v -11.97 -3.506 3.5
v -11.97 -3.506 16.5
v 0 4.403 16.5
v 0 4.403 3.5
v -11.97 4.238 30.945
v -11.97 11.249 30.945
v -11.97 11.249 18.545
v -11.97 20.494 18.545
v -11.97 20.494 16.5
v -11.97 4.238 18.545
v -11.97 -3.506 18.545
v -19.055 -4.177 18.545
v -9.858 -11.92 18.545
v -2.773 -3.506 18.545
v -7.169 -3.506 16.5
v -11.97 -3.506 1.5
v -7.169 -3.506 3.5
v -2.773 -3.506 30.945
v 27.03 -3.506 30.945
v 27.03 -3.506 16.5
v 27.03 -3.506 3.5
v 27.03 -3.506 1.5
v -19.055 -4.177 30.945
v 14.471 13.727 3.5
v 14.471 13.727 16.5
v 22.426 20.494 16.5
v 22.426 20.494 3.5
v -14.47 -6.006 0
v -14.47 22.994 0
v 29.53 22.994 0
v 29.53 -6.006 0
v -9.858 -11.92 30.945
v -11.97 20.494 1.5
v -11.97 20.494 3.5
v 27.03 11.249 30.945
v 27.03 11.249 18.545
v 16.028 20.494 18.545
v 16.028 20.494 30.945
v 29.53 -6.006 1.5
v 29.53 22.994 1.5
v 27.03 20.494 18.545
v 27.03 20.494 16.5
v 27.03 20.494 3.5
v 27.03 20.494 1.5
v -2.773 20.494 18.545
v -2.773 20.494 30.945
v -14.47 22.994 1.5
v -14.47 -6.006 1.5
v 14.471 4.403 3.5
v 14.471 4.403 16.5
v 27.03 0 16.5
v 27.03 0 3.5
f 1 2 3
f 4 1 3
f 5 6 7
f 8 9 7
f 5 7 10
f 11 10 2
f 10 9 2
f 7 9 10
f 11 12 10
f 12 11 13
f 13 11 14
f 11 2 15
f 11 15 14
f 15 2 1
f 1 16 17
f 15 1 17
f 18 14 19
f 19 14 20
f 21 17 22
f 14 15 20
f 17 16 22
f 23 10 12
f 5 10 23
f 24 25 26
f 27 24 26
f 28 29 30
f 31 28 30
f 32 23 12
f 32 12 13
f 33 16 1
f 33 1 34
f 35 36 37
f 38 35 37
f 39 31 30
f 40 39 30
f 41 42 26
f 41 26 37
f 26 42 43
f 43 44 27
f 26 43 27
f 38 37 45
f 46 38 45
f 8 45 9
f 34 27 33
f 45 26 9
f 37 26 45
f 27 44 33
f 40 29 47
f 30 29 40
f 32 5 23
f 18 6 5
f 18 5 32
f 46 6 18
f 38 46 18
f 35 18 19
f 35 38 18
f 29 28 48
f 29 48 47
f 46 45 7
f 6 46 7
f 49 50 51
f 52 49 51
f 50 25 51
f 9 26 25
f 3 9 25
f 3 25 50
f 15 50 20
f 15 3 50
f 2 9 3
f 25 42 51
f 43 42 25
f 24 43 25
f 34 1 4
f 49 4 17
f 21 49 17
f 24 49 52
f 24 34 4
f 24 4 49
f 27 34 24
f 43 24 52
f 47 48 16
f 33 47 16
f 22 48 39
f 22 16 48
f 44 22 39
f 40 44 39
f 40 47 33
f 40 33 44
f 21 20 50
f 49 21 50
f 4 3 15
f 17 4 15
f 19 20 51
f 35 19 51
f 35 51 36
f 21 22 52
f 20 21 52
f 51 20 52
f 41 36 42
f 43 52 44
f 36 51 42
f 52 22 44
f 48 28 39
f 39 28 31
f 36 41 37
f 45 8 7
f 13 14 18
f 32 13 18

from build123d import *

# Parameters (mm, degrees)
F0_W      = 44
F0_H      = 29
F1_DEPTH  = 1.5
F2_W      = 39
F2_H      = 24
F3_DEPTH  = 15
F5_DEPTH  = 13
F8_W      = 24
F8_H      = 2.0449477285
F9_DEPTH  = 39
F11_DEPTH = 12.4
F12_W     = 12.0227243644
F12_H     = 12.4
F13_DEPTH = 11


# Not quite as in the source:
# - a feature names something its author has since deleted; it is built from what else it names


with BuildPart() as f1:
    # F0 (on Top) → F1 (new body)
    with BuildSketch(Plane.XY):
        with Locations((7.5298845768, 8.4944772368)):
            Rectangle(F0_W, F0_H)
    extrude(amount=F1_DEPTH)

    # F2 (on face) → F3 (join)
    with BuildSketch(Plane.XY.offset(1.5)):
        with Locations((7.5298845768, 8.4944772368)):
            Rectangle(F2_W, F2_H)
    extrude(amount=F3_DEPTH)

    # F4 (on face) → F5 (cut)
    with BuildSketch(Plane.XY.offset(16.5)):
        Polygon((22.4261898547, 20.4944772368), (-11.9701154232, 20.4944772368), (-11.9701154232, -3.5055227632), (0, 4.4034305029), (-7.16903992, -3.5055227632), (27.0298845768, -3.5055227632), (14.4714023918, 4.4034305029), (27.0298845768, 0), (27.0298845768, 20.4944772368), (14.4714023918, 13.7267839164), align=None)
    extrude(amount=-F5_DEPTH, mode=Mode.SUBTRACT)

    # F8 (on face) → F9 (join)
    with BuildSketch(Plane(origin=(-11.9701154232, 0, 0), x_dir=(0, -1, 0), z_dir=(-1, 0, 0))):
        with Locations((-8.4944772368, 17.5224738643)):
            Rectangle(F8_W, F8_H)
    extrude(amount=-F9_DEPTH)

    # F10 (on face) → F11 (join)
    with BuildSketch(Plane.XY.offset(18.5449477285)):
        Polygon((16.0282067955, 20.4944772368), (-2.7732178569, 20.4944772368), (-11.9701154232, 11.2487543374), (-11.9701154232, 4.2380536906), (-2.7732178569, -3.5055227632), (27.0298845768, -3.5055227632), (27.0298845768, 11.2487543374), align=None)
    extrude(amount=F11_DEPTH)

    # F12 (on face) → F13 (join)
    with BuildSketch(Plane(origin=(-2.8775827287, -3.4176499389, 0), x_dir=(0.7649595289, -0.6440783486, 0), z_dir=(-0.6440783486, -0.7649595289, 0))):
        with Locations((-5.8749302955, 24.7449477285)):
            Rectangle(F12_W, F12_H)
    extrude(amount=F13_DEPTH)


solid = f1.part
